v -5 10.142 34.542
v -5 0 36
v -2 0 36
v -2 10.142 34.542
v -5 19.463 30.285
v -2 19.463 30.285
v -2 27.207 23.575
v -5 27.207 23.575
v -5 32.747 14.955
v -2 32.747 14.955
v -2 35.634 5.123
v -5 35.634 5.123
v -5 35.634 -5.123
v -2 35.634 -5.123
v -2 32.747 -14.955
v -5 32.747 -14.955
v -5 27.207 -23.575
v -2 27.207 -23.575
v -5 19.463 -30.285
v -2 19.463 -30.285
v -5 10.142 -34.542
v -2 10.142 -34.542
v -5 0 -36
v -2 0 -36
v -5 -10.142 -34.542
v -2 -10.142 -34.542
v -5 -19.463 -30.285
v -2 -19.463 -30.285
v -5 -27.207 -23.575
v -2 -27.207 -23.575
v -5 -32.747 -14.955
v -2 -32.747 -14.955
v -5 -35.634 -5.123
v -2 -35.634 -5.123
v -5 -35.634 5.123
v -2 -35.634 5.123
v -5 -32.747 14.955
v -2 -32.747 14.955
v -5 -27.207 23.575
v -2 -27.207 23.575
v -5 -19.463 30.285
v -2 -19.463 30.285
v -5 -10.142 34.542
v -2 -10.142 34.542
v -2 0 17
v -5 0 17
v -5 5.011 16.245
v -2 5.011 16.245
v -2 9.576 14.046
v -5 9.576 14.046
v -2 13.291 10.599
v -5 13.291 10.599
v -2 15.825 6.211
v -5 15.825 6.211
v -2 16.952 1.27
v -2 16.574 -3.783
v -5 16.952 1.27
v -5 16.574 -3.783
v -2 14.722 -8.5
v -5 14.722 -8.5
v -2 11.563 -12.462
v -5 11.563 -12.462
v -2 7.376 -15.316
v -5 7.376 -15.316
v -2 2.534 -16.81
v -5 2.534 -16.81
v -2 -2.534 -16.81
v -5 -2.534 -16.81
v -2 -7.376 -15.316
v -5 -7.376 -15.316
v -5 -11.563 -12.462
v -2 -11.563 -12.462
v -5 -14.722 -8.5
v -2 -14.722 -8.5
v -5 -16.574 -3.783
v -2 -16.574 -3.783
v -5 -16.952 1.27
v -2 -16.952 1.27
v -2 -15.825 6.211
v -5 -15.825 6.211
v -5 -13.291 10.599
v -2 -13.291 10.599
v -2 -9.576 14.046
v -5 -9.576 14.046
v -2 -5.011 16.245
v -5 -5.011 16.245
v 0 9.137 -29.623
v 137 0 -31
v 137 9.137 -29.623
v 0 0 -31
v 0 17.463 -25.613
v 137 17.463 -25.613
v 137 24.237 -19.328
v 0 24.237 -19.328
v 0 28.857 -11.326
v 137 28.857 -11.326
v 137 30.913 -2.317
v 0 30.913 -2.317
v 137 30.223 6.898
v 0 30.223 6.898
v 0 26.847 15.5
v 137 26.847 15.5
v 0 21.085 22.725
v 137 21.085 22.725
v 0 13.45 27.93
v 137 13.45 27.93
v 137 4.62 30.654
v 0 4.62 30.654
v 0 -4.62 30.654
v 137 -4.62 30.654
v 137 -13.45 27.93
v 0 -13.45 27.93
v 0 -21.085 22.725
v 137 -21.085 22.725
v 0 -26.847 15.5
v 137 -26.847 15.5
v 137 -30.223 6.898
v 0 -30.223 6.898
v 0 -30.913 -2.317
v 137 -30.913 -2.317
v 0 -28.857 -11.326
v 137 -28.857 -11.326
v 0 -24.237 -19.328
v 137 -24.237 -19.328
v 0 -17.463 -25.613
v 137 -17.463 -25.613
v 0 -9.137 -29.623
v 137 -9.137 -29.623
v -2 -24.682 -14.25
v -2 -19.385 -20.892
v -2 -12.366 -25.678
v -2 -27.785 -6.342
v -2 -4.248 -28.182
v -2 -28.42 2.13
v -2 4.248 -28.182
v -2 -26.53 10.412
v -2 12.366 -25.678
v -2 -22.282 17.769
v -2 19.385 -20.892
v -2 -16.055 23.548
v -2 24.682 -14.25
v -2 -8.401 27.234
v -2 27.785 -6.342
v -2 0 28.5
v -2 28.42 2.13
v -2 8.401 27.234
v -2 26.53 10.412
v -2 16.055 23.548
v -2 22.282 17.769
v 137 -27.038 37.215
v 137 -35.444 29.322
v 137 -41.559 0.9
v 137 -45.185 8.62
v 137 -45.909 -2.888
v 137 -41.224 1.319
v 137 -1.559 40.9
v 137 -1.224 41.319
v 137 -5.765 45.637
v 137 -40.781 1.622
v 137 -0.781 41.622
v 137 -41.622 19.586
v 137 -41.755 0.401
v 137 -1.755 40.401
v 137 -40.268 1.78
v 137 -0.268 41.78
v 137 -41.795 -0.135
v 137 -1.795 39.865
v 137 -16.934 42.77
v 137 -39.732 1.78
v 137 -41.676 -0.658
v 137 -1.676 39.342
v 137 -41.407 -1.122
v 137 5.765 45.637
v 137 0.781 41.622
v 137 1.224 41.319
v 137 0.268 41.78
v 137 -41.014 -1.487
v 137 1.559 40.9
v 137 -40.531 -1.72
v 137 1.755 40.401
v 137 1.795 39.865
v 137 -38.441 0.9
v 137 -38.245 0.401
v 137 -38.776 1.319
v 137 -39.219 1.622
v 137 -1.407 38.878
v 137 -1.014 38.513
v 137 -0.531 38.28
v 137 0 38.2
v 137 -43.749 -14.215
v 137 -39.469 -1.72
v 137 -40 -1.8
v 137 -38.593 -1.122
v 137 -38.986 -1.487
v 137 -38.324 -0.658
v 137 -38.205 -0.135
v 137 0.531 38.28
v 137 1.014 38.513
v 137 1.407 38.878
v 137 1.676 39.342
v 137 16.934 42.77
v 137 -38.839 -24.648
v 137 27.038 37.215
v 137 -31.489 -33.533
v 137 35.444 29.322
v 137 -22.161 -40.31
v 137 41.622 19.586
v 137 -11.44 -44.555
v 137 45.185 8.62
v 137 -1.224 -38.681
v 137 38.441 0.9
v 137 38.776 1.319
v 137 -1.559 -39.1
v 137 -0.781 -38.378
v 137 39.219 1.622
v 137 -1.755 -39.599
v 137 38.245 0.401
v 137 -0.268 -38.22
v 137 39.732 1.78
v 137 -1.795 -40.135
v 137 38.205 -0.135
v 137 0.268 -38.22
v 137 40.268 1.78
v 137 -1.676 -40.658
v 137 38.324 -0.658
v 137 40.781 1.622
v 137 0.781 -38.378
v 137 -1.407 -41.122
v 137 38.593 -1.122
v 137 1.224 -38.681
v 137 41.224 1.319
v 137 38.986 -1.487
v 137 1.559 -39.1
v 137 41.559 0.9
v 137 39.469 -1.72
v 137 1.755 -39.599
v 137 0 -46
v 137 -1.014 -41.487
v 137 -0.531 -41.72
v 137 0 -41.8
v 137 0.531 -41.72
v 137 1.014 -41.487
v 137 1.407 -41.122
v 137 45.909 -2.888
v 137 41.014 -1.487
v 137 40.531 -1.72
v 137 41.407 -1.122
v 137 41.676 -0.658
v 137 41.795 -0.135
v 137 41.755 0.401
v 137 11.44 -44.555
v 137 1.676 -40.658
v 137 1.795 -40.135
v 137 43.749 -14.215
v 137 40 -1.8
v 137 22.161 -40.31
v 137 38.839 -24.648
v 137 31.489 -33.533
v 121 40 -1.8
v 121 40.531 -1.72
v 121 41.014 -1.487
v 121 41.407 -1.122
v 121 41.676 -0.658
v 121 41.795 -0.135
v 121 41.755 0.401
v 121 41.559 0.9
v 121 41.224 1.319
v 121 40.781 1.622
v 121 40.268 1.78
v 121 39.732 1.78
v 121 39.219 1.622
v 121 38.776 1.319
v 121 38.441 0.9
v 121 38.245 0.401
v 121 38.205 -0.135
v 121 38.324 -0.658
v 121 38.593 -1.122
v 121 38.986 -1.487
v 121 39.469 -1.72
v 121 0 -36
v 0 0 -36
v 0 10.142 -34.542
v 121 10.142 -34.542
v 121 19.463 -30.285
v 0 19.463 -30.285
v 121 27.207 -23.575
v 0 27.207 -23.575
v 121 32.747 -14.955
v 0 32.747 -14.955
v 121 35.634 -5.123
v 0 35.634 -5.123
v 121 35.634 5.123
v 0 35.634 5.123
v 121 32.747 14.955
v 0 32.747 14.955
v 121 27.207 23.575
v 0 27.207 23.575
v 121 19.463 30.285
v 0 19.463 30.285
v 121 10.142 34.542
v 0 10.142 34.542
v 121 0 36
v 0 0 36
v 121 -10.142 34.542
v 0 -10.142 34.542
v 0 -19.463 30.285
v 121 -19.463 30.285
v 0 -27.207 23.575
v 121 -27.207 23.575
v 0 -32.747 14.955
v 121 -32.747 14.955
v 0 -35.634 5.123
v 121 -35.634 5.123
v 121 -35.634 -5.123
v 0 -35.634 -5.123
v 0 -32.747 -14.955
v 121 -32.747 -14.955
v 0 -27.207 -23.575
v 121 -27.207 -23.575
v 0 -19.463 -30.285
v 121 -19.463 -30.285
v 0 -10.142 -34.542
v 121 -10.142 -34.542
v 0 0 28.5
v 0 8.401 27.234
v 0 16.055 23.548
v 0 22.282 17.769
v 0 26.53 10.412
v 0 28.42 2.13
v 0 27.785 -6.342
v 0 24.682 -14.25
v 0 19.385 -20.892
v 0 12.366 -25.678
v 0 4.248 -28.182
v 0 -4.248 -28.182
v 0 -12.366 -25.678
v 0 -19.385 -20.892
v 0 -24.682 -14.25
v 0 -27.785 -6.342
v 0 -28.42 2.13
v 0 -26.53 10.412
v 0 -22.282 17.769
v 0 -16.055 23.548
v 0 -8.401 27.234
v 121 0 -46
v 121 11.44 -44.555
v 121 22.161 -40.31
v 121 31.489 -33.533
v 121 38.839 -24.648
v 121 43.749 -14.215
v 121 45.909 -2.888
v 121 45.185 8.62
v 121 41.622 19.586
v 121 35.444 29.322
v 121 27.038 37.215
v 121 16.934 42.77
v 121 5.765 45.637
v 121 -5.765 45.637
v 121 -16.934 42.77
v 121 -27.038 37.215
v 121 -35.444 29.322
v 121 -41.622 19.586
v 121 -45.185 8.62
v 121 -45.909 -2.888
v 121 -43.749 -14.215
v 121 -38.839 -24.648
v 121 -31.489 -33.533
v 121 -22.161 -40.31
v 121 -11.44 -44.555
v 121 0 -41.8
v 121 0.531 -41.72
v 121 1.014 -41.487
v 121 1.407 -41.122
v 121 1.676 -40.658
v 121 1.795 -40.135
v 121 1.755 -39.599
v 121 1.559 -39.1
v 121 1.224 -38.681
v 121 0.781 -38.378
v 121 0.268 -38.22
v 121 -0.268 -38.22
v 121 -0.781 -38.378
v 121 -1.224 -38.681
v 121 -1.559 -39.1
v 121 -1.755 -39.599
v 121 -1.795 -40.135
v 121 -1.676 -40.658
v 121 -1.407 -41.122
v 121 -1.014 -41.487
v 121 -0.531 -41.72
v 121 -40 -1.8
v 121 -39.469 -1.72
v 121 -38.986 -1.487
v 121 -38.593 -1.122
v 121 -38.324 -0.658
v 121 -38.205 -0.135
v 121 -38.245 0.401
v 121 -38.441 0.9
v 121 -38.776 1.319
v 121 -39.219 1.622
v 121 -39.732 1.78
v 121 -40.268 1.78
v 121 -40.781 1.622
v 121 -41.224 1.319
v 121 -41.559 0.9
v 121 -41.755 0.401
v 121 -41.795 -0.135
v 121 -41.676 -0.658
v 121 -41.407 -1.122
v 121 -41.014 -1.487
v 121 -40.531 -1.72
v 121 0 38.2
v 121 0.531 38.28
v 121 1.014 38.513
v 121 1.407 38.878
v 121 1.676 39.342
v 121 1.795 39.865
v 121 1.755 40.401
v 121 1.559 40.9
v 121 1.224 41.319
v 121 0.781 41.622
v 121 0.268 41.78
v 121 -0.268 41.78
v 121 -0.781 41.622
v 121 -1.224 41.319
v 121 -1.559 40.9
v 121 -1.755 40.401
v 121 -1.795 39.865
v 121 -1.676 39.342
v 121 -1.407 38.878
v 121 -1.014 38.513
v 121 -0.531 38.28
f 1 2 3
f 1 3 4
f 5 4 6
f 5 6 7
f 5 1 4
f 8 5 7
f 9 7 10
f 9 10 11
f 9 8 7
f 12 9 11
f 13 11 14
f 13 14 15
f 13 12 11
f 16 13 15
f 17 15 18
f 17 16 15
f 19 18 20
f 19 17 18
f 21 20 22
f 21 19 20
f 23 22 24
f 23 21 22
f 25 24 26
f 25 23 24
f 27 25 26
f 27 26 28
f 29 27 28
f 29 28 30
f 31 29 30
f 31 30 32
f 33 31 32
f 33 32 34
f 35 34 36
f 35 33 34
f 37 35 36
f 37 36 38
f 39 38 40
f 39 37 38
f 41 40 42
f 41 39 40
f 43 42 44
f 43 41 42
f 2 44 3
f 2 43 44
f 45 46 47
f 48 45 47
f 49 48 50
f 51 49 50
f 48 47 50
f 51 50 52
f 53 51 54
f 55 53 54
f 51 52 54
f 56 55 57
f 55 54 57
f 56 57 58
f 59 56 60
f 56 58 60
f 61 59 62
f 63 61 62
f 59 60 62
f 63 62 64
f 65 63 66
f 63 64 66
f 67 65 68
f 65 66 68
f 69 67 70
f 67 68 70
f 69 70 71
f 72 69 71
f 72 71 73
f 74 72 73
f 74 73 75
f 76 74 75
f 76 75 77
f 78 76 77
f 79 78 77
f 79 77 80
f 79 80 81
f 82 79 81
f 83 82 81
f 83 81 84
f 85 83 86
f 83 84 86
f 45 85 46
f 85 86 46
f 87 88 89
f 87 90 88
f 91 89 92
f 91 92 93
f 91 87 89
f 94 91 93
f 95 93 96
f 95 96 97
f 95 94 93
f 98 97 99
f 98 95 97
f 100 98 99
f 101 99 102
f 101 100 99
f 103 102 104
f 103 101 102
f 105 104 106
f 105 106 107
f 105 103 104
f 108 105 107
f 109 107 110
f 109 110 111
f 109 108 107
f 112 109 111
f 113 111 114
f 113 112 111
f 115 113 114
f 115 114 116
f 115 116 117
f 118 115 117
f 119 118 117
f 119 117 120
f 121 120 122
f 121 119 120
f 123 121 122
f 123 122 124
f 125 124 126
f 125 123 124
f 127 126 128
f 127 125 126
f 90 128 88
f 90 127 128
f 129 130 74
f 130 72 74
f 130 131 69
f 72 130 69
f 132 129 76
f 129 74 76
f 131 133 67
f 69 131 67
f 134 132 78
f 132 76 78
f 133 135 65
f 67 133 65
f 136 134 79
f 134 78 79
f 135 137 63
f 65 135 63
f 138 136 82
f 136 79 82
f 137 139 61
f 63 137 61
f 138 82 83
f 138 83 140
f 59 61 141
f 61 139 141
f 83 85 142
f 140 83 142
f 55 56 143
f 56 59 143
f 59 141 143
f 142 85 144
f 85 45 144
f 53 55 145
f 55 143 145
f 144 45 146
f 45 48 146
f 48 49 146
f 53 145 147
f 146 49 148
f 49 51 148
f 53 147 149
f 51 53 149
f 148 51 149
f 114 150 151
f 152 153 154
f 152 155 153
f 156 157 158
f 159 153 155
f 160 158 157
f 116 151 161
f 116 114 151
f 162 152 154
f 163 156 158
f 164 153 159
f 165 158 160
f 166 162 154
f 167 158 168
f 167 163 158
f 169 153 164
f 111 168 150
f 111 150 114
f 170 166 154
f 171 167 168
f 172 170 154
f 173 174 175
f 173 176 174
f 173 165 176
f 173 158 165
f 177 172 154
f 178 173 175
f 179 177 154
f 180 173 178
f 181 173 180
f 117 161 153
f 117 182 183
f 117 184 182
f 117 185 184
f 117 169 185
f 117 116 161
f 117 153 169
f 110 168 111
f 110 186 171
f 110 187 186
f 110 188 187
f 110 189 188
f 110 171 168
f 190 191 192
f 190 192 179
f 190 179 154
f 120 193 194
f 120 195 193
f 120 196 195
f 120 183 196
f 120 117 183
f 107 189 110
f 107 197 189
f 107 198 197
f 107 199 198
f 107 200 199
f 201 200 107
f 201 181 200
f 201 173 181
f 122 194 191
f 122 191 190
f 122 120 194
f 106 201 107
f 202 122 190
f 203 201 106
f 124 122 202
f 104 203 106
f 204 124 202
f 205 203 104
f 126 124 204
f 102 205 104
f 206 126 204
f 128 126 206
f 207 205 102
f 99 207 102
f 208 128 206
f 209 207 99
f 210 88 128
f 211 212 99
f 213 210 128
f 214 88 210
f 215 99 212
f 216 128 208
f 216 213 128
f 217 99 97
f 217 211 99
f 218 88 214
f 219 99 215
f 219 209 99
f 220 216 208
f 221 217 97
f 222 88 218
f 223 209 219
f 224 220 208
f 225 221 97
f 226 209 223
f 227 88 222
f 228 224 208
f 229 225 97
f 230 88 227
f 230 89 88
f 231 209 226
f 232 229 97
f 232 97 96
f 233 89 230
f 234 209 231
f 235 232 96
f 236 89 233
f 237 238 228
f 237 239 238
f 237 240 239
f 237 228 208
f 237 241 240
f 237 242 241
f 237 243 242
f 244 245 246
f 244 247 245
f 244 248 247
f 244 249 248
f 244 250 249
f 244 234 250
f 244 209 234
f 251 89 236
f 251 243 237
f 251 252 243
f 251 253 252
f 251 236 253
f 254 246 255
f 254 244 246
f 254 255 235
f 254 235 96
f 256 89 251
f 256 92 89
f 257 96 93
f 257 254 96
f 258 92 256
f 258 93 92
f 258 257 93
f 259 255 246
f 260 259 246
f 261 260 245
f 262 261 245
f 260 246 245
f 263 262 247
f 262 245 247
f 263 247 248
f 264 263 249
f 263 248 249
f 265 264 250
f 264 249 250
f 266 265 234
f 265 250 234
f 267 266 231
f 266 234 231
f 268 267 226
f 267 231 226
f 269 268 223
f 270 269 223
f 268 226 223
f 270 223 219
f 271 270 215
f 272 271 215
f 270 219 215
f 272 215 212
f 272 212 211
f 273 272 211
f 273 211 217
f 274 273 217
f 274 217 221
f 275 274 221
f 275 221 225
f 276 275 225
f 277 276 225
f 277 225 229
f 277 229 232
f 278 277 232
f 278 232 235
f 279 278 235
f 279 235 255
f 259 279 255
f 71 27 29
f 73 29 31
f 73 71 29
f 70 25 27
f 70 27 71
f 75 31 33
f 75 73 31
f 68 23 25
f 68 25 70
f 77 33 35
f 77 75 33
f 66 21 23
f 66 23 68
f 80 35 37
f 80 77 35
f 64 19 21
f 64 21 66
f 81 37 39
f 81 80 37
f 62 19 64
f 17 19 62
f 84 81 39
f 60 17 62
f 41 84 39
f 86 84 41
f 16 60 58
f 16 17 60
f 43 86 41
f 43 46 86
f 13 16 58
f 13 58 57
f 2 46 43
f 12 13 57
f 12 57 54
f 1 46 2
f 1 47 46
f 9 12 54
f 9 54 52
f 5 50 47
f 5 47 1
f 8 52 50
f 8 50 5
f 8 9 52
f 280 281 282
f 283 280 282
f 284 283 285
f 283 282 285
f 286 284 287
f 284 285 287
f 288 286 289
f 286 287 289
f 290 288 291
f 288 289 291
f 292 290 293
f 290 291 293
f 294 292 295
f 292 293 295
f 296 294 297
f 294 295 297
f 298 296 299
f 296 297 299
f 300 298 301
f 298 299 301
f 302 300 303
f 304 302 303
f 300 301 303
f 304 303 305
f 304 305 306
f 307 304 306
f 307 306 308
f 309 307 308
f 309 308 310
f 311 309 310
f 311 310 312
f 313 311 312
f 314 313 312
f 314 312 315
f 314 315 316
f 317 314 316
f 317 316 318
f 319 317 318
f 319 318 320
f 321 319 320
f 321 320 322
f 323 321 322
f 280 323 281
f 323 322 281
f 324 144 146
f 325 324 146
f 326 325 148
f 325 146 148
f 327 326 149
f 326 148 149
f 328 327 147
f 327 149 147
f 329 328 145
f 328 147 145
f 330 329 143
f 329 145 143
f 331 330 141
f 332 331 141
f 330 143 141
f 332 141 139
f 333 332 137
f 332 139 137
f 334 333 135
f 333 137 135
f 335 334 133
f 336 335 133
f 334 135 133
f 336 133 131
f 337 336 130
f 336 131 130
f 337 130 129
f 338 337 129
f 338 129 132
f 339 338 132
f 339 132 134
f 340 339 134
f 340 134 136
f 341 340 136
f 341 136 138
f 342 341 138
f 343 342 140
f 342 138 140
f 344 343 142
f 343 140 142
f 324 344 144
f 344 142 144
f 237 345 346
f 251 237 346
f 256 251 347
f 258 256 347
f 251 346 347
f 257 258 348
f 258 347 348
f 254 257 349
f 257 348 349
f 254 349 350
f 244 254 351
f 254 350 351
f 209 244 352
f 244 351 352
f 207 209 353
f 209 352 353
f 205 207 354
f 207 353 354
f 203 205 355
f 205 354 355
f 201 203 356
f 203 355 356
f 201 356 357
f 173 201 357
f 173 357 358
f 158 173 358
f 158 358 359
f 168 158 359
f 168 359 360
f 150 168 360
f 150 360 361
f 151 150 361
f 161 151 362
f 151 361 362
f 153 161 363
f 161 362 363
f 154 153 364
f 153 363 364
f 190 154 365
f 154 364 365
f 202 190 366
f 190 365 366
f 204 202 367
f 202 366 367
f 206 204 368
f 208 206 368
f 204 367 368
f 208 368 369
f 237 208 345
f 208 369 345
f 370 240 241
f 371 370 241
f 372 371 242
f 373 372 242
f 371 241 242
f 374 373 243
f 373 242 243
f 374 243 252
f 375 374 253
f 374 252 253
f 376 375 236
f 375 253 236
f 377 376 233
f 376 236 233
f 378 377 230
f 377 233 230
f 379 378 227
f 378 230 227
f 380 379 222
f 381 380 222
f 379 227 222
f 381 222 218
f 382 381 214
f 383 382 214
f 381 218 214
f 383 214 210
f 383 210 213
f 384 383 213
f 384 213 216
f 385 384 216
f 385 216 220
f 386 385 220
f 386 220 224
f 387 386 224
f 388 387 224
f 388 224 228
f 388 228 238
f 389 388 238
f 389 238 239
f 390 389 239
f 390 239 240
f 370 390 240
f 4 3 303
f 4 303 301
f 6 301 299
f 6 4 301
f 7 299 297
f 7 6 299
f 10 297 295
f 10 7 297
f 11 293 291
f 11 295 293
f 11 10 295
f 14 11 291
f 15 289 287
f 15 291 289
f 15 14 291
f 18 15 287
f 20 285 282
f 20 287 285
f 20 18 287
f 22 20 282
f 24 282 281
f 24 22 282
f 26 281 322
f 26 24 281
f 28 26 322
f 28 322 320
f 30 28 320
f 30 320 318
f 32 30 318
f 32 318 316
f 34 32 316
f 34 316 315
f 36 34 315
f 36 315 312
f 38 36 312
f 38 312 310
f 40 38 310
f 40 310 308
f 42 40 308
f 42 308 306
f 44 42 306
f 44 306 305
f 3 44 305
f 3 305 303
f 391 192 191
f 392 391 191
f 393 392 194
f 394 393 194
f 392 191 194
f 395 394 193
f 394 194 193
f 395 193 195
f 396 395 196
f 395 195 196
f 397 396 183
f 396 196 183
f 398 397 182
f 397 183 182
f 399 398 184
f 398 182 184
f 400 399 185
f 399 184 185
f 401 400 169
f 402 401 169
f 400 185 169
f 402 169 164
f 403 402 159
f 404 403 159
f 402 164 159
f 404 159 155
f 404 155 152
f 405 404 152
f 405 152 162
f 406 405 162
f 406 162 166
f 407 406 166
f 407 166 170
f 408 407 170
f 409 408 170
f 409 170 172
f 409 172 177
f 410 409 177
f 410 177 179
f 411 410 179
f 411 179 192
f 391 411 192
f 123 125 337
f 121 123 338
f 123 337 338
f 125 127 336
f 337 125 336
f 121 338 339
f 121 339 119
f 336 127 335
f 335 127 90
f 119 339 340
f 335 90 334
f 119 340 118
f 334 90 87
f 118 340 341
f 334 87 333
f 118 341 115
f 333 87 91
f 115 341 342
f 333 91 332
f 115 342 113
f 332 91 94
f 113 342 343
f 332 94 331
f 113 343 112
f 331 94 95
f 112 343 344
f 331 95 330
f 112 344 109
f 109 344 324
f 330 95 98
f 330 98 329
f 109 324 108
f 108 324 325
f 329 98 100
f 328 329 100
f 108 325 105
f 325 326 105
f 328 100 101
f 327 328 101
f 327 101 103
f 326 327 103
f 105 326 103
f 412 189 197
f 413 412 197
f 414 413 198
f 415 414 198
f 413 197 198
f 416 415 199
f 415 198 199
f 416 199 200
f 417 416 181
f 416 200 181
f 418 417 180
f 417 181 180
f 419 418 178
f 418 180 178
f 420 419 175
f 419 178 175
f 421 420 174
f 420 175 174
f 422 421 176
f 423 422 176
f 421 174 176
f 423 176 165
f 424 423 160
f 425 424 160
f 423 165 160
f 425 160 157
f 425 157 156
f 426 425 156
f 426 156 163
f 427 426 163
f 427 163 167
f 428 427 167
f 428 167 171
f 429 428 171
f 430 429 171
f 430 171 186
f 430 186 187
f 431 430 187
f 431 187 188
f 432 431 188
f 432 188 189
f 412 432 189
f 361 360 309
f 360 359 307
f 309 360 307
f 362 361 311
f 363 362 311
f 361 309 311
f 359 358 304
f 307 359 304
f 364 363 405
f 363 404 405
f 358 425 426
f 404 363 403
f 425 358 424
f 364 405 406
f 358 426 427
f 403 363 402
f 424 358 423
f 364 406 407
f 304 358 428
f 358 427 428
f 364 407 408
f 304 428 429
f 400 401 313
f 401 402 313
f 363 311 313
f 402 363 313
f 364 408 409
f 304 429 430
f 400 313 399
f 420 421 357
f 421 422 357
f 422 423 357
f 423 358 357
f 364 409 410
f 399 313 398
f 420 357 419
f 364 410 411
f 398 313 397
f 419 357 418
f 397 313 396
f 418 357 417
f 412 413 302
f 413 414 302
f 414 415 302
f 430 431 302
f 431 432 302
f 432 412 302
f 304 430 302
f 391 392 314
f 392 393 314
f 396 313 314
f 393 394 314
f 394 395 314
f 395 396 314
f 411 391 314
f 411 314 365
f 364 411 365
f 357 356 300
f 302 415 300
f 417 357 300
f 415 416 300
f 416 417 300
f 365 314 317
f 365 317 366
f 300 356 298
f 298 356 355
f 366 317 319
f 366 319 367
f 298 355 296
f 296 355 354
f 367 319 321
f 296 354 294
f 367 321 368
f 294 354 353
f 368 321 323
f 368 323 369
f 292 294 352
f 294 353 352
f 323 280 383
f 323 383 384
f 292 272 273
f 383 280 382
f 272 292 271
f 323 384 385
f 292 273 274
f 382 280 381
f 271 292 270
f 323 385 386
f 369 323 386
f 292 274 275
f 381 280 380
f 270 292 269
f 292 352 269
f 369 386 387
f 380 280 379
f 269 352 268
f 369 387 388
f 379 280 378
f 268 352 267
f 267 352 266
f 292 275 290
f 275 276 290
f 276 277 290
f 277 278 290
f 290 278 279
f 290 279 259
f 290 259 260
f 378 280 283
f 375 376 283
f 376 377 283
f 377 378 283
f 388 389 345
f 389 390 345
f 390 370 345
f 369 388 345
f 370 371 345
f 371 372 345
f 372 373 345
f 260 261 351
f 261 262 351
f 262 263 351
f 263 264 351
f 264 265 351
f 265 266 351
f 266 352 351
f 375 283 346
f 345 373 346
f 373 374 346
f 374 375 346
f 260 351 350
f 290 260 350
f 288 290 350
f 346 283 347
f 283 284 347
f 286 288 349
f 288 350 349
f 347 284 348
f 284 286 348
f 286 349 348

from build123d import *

# Parameters (mm, degrees)
SKETCH_1_R          = 36
SKETCH_1_R_2        = 31
EXTRUDE_1_DEPTH     = 121
SKETCH_2_R          = 46
SKETCH_2_R_2        = 31
EXTRUDE_2_DEPTH     = 16
EXTRUDE_START       = 2
SKETCH_3_R          = 36
SKETCH_3_R_2        = 28.5
EXTRUDE_3_DEPTH     = 2
EXTRUDE_START_2     = 3
SKETCH_4_R          = 36
SKETCH_4_R_2        = 17
EXTRUDE_4_DEPTH     = 3
SKETCH_5_R          = 1.8
CUT_EXTRUDE_1_DEPTH = 20


with BuildPart() as part:
    # 草图1 → 凸台-拉伸1 (new body)
    with BuildSketch(Plane(origin=(0, 0, 0), x_dir=(0, 0, -1), z_dir=(1, 0, 0))):
        Circle(SKETCH_1_R)
        Circle(SKETCH_1_R_2, mode=Mode.SUBTRACT)
    extrude(amount=EXTRUDE_1_DEPTH)

    # 草图2 → 凸台-拉伸2 (add)
    with BuildSketch(Plane(origin=(121, 0, 0), x_dir=(0, 0, -1), z_dir=(1, 0, 0))):
        Circle(SKETCH_2_R)
        Circle(SKETCH_2_R_2, mode=Mode.SUBTRACT)
    extrude(amount=EXTRUDE_2_DEPTH)

    # 草图3 → 凸台-拉伸3 (add)
    with BuildSketch(Plane.ZY.offset(EXTRUDE_START)):
        Circle(SKETCH_3_R)
        Circle(SKETCH_3_R_2, mode=Mode.SUBTRACT)
    extrude(amount=-EXTRUDE_3_DEPTH)

    # 草图4 → 凸台-拉伸4 (add)
    with BuildSketch(Plane.ZY.offset(2).offset(EXTRUDE_START_2)):
        Circle(SKETCH_4_R)
        Circle(SKETCH_4_R_2, mode=Mode.SUBTRACT)
    extrude(amount=-EXTRUDE_4_DEPTH)

    # 草图5 → 切除-拉伸1 (cut)
    with BuildSketch(Plane(origin=(137, 0, 0), x_dir=(0, 0, -1), z_dir=(1, 0, 0))):
        with Locations((0, 40)):
            Circle(SKETCH_5_R)
        with Locations((40, 0)):
            Circle(SKETCH_5_R)
        with Locations((0, -40)):
            Circle(SKETCH_5_R)
        with Locations((-40, 0)):
            Circle(SKETCH_5_R)
    extrude(amount=-CUT_EXTRUDE_1_DEPTH, mode=Mode.SUBTRACT)


solid = part.part
